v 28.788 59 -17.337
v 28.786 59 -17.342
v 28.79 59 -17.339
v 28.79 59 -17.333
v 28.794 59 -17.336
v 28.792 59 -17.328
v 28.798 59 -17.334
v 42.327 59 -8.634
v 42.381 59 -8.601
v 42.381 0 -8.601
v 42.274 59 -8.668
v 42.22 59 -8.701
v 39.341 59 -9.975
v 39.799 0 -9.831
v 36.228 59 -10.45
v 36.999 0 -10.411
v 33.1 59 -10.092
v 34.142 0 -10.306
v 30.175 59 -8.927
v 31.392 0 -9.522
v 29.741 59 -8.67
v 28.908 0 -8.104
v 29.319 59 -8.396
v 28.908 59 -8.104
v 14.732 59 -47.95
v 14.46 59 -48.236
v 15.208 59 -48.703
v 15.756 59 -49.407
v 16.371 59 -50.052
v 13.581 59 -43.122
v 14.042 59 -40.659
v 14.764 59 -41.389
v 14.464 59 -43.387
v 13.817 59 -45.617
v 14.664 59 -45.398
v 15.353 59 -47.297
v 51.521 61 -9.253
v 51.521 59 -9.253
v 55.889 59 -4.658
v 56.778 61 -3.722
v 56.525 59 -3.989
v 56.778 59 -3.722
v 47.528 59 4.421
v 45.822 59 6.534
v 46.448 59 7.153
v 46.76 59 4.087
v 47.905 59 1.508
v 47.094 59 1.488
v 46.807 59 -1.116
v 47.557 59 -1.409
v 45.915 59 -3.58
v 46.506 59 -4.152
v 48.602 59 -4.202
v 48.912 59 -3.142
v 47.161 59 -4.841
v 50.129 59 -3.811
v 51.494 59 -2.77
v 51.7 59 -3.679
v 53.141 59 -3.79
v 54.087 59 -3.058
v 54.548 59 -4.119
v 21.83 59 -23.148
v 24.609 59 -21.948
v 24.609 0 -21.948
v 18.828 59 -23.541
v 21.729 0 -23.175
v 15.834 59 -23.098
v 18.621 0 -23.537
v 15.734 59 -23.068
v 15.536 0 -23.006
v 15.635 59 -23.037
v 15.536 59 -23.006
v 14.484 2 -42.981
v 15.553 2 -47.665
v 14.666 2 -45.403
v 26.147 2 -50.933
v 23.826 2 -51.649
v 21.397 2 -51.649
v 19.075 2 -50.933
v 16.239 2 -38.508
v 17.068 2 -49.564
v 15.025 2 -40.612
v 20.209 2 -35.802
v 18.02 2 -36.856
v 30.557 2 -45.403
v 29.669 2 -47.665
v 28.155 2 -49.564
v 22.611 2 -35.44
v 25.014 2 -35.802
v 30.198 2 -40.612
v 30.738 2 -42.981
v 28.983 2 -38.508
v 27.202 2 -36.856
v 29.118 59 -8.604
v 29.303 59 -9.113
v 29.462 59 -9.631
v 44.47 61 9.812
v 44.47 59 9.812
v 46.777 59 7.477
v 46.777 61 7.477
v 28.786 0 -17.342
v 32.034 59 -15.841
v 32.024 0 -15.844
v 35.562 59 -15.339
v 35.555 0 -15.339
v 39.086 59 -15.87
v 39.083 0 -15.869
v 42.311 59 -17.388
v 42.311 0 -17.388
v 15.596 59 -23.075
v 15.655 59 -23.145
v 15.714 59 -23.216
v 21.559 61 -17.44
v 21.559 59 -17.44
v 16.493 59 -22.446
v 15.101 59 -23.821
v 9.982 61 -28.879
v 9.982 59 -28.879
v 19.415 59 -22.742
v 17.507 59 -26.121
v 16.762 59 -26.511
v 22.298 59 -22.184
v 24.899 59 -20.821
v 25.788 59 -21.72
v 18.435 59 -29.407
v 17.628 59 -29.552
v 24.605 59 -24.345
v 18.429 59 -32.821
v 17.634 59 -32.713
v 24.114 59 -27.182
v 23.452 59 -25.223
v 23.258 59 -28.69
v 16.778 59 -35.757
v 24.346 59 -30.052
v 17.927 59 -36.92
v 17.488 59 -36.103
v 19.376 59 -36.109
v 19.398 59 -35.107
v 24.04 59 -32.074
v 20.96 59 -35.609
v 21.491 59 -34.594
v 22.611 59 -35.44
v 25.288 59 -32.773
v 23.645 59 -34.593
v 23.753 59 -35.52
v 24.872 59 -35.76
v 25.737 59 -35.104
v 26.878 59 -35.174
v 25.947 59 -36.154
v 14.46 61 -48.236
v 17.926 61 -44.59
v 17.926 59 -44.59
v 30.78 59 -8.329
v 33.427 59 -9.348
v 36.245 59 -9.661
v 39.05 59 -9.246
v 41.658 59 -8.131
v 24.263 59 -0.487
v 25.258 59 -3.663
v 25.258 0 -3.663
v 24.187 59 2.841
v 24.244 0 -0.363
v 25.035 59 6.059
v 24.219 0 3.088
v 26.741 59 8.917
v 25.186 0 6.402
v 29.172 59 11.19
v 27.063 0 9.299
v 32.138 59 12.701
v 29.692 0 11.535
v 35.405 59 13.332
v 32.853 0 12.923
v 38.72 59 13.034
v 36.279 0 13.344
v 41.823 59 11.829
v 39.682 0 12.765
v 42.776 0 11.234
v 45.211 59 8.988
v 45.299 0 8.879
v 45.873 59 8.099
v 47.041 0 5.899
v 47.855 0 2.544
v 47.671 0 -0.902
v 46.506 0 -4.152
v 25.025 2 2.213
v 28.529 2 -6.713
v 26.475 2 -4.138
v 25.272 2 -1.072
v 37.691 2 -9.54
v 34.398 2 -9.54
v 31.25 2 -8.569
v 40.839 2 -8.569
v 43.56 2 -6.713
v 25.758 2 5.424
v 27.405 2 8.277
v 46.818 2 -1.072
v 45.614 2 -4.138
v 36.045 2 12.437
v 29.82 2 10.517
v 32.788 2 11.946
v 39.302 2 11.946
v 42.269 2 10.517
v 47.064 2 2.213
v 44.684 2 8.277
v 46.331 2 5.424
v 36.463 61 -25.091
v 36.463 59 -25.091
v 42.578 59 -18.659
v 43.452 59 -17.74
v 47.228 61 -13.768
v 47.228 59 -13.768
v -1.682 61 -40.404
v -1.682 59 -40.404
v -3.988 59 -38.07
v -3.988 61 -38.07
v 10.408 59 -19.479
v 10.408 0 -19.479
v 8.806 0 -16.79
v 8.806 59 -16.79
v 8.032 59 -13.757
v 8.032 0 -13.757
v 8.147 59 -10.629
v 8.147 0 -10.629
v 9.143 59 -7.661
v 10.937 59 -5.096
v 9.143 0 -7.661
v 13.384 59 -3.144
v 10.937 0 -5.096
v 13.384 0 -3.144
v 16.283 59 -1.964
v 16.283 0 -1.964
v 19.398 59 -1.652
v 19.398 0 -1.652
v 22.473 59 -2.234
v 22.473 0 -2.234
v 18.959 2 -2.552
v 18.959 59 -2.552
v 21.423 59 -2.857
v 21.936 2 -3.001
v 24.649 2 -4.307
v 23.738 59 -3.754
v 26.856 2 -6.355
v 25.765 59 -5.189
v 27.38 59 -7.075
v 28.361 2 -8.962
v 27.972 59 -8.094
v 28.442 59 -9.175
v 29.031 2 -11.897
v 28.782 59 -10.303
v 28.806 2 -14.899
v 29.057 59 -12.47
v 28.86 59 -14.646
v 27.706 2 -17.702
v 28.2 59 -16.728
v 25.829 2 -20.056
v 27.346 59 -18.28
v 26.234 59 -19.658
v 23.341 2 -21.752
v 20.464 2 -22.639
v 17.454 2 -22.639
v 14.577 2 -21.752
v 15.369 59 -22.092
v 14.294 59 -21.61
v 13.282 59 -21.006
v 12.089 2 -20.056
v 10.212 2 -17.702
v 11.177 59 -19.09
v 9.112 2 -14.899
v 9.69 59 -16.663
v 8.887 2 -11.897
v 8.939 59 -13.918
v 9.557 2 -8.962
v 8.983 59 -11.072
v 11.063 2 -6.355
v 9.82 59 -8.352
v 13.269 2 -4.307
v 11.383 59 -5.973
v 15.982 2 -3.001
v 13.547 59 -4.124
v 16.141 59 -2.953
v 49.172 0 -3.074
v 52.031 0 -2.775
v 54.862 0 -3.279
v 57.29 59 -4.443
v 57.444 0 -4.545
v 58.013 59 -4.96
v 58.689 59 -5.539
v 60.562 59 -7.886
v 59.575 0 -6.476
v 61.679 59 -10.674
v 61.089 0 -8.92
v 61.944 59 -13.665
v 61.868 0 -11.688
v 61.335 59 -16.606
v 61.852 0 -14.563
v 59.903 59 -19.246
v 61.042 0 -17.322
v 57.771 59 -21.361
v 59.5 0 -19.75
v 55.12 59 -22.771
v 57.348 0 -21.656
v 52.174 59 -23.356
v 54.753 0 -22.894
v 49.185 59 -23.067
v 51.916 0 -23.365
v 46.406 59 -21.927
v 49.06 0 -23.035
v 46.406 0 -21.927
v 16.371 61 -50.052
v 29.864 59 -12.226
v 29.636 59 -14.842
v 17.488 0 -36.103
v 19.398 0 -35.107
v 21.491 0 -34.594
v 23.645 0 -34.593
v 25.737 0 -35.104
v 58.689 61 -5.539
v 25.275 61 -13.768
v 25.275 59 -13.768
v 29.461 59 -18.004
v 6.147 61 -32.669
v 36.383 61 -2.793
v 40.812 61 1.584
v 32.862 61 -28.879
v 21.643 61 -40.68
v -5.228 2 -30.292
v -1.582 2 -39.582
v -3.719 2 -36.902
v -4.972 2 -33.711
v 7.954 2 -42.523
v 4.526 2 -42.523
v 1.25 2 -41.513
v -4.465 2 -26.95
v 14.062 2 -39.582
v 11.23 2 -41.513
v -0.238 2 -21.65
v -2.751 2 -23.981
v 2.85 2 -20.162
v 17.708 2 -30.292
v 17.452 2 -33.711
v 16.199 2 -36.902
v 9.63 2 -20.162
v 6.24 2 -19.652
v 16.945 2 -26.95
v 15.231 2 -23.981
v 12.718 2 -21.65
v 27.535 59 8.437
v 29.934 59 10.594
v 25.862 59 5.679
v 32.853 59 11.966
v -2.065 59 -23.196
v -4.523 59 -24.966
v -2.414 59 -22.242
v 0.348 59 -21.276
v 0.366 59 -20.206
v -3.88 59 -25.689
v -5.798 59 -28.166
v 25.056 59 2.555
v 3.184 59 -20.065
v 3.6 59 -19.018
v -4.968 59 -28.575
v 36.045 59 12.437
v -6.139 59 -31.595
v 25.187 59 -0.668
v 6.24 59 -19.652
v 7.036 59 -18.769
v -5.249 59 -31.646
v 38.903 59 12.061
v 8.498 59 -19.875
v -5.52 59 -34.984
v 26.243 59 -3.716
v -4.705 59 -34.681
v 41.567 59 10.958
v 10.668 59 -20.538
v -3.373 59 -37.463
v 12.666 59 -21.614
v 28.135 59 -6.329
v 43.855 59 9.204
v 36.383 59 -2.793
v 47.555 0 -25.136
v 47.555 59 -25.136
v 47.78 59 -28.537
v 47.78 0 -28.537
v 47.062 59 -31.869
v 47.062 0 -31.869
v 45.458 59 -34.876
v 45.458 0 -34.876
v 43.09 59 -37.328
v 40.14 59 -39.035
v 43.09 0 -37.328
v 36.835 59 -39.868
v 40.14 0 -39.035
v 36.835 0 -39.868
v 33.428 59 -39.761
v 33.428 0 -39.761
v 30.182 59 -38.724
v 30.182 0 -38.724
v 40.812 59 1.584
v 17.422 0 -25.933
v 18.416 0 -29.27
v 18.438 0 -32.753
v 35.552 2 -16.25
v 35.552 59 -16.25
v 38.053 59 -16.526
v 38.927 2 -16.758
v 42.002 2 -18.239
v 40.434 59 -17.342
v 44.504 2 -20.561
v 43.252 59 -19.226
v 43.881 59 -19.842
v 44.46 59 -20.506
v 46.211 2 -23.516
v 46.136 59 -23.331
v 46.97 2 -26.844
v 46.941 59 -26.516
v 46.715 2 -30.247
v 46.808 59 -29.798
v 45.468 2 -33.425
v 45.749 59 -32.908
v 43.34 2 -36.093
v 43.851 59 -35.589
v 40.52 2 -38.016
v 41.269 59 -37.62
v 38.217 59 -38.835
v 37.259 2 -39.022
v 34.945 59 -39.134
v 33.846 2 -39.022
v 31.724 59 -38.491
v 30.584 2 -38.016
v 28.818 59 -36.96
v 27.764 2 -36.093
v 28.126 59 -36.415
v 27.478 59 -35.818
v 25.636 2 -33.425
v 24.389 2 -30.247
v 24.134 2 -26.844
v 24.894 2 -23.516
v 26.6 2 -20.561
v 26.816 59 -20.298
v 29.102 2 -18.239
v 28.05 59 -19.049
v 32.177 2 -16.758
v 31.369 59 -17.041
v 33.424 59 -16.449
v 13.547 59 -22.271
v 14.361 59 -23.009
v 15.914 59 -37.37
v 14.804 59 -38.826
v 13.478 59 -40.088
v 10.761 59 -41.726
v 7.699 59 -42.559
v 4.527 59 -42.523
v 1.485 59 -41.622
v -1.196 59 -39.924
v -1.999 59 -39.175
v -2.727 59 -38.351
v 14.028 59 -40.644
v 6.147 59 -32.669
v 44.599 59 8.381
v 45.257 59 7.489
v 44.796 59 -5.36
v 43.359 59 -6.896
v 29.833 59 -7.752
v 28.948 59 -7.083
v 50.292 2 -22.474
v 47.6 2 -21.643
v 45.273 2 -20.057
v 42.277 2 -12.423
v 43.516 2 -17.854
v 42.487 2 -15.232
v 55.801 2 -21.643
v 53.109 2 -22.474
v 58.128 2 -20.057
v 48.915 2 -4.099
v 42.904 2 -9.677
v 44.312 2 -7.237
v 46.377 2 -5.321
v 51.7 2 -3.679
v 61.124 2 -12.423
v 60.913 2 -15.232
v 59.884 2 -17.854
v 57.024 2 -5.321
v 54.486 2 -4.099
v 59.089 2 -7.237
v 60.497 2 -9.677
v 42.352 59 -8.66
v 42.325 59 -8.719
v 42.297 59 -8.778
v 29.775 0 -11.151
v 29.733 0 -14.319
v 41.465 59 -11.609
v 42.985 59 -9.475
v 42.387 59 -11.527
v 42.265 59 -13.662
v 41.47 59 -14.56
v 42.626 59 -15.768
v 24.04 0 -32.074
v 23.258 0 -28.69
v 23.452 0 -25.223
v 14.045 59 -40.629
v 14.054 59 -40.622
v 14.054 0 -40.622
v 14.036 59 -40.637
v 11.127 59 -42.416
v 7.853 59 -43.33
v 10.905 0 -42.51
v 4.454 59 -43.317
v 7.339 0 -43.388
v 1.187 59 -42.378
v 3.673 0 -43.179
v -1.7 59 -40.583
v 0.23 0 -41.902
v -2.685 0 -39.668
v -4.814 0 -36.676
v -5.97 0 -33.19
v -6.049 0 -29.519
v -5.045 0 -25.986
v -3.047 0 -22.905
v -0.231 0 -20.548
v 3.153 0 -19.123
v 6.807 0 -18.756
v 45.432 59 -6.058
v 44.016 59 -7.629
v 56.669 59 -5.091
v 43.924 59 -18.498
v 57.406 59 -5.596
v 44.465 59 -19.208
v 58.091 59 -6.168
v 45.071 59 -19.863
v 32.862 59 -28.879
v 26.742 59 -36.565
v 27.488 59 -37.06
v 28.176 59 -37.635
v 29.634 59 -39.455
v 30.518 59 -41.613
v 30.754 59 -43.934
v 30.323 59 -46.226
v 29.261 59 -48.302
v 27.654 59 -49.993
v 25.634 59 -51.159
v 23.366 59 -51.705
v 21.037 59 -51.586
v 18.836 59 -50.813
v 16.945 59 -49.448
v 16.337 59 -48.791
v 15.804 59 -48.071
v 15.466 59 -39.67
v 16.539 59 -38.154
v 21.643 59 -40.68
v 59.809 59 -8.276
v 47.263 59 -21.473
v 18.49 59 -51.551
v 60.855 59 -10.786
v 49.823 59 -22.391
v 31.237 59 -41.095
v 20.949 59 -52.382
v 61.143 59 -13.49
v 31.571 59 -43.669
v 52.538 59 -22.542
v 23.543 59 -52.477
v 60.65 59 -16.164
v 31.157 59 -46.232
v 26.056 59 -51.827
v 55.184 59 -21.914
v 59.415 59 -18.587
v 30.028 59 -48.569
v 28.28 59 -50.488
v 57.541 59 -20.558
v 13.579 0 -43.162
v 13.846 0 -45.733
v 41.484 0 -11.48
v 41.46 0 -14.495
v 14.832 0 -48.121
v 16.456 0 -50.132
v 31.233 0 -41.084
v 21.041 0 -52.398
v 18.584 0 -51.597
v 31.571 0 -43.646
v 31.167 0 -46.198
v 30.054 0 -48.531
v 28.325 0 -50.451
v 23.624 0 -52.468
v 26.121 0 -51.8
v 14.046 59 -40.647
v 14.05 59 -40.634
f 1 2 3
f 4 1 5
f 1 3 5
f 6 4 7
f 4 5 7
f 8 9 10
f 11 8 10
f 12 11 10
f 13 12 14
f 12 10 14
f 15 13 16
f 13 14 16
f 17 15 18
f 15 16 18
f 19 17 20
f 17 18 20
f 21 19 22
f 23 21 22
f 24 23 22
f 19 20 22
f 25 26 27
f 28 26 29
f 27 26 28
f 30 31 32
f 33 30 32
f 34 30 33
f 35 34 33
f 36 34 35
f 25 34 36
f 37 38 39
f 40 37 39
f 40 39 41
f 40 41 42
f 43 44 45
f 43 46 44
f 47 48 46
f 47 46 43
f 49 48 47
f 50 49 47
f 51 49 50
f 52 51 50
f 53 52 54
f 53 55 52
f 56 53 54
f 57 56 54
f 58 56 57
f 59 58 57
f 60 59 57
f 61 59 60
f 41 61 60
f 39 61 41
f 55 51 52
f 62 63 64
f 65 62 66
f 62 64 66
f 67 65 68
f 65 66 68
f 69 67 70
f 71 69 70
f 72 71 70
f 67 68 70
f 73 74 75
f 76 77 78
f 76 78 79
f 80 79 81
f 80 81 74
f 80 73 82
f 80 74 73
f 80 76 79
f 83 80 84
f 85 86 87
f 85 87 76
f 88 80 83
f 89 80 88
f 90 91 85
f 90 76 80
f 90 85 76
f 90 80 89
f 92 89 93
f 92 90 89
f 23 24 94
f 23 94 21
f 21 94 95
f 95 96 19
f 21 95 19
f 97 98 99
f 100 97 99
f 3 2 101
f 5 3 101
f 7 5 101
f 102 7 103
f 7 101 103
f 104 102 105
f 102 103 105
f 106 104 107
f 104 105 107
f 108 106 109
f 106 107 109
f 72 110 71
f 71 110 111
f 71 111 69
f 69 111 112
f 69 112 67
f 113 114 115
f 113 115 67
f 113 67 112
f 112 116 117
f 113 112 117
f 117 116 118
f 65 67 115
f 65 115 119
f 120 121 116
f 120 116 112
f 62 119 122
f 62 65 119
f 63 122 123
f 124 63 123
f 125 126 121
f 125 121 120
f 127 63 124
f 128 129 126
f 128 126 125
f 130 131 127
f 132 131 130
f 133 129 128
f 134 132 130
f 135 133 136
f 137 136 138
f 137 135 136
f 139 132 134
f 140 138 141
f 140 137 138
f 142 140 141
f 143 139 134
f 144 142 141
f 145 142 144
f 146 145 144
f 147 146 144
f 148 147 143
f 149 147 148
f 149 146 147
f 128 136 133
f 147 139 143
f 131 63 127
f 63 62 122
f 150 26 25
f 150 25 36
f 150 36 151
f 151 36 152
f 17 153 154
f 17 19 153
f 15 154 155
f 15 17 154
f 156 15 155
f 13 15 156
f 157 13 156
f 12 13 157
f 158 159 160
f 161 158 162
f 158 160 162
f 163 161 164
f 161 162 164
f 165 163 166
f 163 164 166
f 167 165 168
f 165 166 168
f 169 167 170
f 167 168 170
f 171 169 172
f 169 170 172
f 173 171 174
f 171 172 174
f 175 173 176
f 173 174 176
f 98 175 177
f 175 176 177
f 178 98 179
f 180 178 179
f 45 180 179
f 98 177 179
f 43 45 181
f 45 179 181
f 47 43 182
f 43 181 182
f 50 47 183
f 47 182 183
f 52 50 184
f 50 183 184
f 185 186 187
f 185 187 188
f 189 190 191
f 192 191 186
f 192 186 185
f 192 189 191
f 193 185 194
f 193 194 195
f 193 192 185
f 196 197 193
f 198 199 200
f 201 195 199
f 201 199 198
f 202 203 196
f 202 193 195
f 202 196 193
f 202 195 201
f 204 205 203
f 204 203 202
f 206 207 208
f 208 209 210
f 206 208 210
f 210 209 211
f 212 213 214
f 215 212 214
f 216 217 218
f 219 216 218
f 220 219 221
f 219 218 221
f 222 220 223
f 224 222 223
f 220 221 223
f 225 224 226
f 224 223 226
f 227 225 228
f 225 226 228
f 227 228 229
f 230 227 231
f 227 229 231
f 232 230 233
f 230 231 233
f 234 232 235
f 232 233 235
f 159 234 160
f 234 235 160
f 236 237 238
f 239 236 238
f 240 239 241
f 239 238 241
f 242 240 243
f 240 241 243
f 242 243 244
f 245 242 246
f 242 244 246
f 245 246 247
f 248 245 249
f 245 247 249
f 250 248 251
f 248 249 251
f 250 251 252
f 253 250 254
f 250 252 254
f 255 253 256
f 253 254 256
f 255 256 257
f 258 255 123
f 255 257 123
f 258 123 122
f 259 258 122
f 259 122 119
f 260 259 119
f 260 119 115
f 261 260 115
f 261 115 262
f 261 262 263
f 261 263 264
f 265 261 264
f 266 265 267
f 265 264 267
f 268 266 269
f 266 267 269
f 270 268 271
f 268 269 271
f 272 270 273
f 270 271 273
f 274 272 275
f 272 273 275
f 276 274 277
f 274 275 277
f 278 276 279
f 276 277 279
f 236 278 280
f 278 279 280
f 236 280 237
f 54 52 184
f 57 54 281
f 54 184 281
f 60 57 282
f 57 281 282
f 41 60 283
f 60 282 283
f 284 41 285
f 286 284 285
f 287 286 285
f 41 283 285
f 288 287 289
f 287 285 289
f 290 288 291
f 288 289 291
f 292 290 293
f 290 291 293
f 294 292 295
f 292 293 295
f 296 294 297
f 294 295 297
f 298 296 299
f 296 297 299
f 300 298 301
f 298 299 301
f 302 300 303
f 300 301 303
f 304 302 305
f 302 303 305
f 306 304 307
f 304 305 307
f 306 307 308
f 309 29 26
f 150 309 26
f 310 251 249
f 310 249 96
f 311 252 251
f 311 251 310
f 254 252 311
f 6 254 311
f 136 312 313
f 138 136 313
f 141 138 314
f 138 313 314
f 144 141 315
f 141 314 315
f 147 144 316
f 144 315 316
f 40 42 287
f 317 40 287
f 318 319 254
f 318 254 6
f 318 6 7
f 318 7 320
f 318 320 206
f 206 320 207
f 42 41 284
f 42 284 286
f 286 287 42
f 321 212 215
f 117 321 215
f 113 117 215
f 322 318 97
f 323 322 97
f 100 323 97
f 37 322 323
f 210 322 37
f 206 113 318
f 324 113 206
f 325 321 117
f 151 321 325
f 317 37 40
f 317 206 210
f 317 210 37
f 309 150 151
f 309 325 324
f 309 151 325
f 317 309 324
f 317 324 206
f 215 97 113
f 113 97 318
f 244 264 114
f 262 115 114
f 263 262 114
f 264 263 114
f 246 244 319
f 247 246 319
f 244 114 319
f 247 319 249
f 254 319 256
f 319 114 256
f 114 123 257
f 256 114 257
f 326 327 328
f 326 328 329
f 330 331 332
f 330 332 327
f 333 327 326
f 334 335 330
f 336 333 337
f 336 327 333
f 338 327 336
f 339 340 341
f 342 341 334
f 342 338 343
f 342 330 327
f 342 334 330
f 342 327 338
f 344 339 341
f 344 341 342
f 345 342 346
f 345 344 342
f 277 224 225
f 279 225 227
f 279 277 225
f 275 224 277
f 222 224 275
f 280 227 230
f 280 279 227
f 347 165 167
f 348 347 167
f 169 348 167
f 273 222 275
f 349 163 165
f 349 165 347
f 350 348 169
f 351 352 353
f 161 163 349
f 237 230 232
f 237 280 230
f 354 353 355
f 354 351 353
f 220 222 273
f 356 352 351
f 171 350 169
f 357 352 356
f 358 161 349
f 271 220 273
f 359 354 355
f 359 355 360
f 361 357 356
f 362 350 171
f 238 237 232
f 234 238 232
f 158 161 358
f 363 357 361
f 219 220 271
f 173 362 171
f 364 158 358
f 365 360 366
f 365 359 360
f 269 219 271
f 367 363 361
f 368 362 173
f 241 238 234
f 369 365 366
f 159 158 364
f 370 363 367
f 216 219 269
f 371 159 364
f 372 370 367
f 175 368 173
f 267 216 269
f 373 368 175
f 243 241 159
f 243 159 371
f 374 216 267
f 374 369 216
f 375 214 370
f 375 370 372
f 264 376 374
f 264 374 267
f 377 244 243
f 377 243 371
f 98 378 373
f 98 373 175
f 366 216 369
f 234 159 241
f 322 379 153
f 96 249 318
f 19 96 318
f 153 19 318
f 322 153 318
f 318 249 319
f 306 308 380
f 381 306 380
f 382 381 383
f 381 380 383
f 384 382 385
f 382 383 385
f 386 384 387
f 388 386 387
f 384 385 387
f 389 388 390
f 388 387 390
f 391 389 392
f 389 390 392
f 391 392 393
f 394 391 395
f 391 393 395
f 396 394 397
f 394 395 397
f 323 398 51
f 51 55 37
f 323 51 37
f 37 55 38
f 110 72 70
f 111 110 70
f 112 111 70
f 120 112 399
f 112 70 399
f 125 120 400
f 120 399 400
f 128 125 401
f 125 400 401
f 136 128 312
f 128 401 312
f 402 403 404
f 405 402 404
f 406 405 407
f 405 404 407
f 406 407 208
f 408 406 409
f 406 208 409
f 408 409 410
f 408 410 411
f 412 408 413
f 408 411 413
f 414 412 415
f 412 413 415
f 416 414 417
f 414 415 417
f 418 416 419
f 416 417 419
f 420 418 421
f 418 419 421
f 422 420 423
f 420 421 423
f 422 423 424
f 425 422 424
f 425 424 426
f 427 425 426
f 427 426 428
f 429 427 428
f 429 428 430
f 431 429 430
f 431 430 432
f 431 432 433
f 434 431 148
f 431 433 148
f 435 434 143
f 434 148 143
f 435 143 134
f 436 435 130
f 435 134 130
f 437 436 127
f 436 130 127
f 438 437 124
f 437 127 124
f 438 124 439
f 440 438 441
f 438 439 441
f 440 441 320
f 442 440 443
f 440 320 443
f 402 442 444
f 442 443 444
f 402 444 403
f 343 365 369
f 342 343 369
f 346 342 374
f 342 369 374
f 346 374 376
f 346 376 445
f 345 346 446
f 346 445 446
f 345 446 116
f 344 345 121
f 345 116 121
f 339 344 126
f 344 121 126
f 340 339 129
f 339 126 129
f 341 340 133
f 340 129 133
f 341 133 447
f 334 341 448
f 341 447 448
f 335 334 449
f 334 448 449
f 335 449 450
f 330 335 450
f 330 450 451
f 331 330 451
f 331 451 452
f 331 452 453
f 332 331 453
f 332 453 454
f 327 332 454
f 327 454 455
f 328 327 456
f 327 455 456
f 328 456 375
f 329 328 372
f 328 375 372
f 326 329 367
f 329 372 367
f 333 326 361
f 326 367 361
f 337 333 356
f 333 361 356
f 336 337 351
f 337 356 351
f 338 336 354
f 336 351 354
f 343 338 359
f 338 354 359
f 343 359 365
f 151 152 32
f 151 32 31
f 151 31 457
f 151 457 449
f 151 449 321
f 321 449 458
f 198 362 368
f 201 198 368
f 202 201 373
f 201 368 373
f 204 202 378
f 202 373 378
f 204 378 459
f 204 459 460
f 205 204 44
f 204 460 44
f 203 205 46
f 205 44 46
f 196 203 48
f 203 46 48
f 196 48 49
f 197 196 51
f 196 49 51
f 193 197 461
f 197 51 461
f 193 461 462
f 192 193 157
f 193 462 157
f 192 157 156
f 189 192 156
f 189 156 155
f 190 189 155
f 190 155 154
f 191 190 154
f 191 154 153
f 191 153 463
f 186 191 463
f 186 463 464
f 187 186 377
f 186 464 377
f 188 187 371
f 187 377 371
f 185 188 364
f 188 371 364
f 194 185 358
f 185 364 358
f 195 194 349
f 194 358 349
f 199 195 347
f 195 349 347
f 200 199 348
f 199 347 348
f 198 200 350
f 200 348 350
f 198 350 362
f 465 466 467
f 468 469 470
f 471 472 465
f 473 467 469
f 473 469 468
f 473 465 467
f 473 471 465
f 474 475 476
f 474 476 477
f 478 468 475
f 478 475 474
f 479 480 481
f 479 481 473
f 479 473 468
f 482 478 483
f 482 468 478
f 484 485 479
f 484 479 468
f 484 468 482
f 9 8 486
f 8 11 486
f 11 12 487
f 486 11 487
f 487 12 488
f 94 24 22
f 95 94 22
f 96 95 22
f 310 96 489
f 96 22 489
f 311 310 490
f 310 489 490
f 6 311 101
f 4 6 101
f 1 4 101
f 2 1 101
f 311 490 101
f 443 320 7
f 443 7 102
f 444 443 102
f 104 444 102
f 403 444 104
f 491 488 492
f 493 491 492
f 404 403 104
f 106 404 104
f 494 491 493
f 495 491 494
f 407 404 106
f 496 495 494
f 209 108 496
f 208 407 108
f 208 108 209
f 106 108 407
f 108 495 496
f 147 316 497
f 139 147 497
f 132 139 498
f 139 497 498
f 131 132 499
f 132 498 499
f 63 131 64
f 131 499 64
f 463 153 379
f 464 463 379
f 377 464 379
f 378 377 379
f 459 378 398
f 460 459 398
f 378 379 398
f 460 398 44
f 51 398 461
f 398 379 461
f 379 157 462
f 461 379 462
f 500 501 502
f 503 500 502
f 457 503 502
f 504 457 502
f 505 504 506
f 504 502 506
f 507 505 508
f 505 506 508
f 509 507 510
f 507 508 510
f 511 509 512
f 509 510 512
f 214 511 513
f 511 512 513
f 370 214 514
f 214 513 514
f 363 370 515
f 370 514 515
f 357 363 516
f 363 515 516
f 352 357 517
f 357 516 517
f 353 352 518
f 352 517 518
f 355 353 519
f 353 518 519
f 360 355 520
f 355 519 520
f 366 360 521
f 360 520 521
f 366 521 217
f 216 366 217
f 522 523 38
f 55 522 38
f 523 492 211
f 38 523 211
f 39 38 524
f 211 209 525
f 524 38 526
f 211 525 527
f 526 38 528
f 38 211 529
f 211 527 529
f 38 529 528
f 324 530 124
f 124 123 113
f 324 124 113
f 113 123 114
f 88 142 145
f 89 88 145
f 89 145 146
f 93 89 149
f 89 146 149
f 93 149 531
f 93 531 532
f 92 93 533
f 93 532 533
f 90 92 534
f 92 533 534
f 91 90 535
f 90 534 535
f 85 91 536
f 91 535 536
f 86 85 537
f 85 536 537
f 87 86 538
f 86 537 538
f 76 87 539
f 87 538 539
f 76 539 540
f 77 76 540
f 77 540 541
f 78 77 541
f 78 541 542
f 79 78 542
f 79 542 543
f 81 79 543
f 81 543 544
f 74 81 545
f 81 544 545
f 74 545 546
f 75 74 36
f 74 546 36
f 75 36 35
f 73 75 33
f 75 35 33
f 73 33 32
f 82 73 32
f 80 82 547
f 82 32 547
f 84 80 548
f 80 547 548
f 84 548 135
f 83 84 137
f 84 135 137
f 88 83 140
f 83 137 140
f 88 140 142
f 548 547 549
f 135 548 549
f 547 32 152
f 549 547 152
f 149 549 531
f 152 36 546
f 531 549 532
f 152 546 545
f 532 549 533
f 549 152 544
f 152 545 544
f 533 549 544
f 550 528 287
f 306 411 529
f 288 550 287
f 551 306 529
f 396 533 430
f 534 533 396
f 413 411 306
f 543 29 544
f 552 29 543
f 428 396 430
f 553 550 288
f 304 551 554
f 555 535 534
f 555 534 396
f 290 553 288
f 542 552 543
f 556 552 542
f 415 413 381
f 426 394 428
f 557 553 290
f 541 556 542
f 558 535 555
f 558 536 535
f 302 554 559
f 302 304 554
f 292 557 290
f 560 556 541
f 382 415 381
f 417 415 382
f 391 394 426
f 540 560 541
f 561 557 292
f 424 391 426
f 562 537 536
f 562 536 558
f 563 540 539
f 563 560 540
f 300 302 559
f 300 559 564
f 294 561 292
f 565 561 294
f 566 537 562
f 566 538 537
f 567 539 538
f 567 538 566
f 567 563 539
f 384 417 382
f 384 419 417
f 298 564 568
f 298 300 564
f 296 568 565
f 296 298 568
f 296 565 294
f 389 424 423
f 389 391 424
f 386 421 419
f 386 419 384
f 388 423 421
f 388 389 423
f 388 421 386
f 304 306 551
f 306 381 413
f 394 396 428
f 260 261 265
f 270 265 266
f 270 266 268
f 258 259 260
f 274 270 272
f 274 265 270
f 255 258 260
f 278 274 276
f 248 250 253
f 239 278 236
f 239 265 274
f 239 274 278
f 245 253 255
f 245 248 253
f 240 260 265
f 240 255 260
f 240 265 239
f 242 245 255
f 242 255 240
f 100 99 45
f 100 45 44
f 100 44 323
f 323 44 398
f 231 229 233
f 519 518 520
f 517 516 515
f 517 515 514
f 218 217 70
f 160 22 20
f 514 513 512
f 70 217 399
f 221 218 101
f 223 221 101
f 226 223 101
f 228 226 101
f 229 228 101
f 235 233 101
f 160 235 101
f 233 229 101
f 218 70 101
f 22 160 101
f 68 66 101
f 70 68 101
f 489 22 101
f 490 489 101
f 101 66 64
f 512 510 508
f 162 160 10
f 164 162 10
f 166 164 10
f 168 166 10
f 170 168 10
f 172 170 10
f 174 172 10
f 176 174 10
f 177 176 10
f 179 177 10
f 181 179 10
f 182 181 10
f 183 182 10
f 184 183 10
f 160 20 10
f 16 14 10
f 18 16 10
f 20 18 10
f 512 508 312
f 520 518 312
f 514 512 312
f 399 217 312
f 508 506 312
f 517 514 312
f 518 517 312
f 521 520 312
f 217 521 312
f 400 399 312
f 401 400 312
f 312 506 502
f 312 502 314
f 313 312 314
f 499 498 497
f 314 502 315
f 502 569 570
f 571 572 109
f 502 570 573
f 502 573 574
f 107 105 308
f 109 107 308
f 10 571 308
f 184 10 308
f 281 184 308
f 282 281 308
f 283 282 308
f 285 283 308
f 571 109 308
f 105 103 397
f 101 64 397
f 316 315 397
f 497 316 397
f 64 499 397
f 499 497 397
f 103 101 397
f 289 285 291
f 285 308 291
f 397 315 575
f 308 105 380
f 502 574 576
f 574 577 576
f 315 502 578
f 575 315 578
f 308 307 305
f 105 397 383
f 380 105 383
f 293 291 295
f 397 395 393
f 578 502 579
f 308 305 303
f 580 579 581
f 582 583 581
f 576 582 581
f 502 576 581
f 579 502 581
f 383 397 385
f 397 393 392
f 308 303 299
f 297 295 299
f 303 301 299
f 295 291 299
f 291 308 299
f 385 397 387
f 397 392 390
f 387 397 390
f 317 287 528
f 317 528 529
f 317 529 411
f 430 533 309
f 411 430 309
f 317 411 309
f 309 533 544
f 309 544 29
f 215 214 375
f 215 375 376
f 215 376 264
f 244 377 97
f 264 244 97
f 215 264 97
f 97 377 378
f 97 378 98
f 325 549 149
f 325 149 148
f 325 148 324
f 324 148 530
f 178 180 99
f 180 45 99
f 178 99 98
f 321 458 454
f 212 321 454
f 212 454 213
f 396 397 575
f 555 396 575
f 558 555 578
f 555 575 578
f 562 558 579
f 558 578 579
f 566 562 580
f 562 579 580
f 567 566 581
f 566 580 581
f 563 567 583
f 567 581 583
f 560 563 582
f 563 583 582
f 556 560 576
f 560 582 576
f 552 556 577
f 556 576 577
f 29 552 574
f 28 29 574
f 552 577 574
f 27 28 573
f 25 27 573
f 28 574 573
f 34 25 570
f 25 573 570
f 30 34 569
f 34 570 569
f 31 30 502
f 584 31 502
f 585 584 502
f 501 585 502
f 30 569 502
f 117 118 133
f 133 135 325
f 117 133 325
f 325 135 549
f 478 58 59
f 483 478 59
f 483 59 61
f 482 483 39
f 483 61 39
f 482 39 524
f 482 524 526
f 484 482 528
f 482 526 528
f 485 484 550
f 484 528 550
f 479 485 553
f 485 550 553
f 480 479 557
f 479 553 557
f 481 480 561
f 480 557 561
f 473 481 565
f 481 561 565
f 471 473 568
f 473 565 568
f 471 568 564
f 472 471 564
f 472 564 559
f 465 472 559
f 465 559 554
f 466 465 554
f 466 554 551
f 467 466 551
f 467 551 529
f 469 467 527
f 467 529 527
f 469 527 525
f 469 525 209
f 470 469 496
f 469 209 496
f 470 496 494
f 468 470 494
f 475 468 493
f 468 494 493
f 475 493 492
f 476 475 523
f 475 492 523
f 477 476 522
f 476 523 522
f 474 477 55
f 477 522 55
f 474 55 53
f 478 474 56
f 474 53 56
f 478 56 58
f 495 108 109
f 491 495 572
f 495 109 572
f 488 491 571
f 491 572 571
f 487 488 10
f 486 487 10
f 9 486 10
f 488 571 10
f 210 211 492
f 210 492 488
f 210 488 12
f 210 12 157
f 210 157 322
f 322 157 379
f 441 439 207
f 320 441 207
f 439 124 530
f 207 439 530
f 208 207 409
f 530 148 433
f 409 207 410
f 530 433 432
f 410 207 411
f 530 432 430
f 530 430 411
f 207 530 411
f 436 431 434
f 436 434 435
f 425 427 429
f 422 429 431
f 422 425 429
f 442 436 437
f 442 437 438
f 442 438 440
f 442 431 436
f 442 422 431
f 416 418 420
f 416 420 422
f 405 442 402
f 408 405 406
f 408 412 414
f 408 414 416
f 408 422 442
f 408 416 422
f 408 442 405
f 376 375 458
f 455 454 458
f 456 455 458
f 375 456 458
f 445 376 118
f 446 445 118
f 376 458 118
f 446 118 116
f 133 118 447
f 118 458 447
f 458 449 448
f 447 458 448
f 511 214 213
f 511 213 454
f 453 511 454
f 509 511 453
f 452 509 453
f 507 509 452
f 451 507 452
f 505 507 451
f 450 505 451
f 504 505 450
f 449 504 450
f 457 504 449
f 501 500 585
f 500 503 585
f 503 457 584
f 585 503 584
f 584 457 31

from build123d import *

# Parameters (mm, degrees)
SKETCH1_R           = 12.3
SKETCH1_R_2         = 11.9
SKETCH1_R_3         = 10.3
SKETCH1_R_4         = 10.95
SKETCH1_R_5         = 12.35
SKETCH1_R_6         = 9
BOSS_EXTRUDE4_DEPTH = 59
SKETCH4_R           = 8.15
SKETCH4_R_2         = 11.5
SKETCH4_R_3         = 10.1
SKETCH4_R_4         = 11.45
SKETCH4_R_5         = 9.45
SKETCH4_R_6         = 11.05
CUT_EXTRUDE2_DEPTH  = 57
BOSS_EXTRUDE5_DEPTH = 2


with BuildPart() as part:
    # Sketch1 → Boss-Extrude4 (new body)
    with BuildSketch(Plane(origin=(0, 0, 0), x_dir=(1, 0, 0), z_dir=(0, 1, 0))):
        with Locations((35.512781465, 27.639016147)):
            Circle(SKETCH1_R)
        with Locations((36.005267937, -1.447561772)):
            Circle(SKETCH1_R_2)
        with Locations((51.661033243, 13.068619292)):
            Circle(SKETCH1_R_3)
        with Locations((18.919707674, 12.591428229)):
            Circle(SKETCH1_R_4)
        with Locations((6.200754384, 31.090907335)):
            Circle(SKETCH1_R_5)
        with Locations((22.571970647, 43.529254056)):
            Circle(SKETCH1_R_6)
    extrude(amount=BOSS_EXTRUDE4_DEPTH)

    # Sketch4 → Cut-Extrude2 (cut)
    with BuildSketch(Plane(origin=(0, 59, 0), x_dir=(1, 0, 0), z_dir=(0, 1, 0))):
        with Locations(Location((22.611280457, 43.589861599, 0), (0, 0, 270))):
            Circle(SKETCH4_R)
        with Locations(Location((6.240064194, 31.151514878, 0), (0, 0, 270))):
            Circle(SKETCH4_R_2)
        with Locations(Location((18.959017484, 12.652035772, 0), (0, 0, 270))):
            Circle(SKETCH4_R_3)
        with Locations(Location((35.552091275, 27.69962369, 0), (0, 0, 270))):
            Circle(SKETCH4_R_4)
        with Locations(Location((51.700343053, 13.129226835, 0), (0, 0, 270))):
            Circle(SKETCH4_R_5)
        with Locations(Location((36.044577747, -1.386954229, 0), (0, 0, 270))):
            Circle(SKETCH4_R_6)
    extrude(amount=-CUT_EXTRUDE2_DEPTH, mode=Mode.SUBTRACT)

    # Sketch5 → Boss-Extrude5 (add)
    with BuildSketch(Plane(origin=(0, 59, 0), x_dir=(1, 0, 0), z_dir=(0, 1, 0))):
        Polygon((40.81243907, -1.58402798), (51.520532369, 9.252965923), (56.778337624, 3.7224031), (58.688878923, 5.538719884), (16.370888419, 50.052027945), (14.460347121, 48.235711161), (17.926333207, 44.589921166), (6.147145479, 32.668939341), (-1.681518051, 40.404484846), (-3.988115938, 38.070120871), (44.470030089, -9.811639827), (46.776627976, -7.477275852), align=None)
        Polygon((36.463308943, 25.091308361), (47.227733247, 13.768461283), (36.382771282, 2.792951133), (25.275141449, 13.768461283), align=None, mode=Mode.SUBTRACT)
        Polygon((21.642995472, 40.680450739), (32.86204414, 28.879394887), (21.559056386, 17.440345379), (9.982307257, 28.879394887), align=None, mode=Mode.SUBTRACT)
    extrude(amount=BOSS_EXTRUDE5_DEPTH)


solid = part.part
